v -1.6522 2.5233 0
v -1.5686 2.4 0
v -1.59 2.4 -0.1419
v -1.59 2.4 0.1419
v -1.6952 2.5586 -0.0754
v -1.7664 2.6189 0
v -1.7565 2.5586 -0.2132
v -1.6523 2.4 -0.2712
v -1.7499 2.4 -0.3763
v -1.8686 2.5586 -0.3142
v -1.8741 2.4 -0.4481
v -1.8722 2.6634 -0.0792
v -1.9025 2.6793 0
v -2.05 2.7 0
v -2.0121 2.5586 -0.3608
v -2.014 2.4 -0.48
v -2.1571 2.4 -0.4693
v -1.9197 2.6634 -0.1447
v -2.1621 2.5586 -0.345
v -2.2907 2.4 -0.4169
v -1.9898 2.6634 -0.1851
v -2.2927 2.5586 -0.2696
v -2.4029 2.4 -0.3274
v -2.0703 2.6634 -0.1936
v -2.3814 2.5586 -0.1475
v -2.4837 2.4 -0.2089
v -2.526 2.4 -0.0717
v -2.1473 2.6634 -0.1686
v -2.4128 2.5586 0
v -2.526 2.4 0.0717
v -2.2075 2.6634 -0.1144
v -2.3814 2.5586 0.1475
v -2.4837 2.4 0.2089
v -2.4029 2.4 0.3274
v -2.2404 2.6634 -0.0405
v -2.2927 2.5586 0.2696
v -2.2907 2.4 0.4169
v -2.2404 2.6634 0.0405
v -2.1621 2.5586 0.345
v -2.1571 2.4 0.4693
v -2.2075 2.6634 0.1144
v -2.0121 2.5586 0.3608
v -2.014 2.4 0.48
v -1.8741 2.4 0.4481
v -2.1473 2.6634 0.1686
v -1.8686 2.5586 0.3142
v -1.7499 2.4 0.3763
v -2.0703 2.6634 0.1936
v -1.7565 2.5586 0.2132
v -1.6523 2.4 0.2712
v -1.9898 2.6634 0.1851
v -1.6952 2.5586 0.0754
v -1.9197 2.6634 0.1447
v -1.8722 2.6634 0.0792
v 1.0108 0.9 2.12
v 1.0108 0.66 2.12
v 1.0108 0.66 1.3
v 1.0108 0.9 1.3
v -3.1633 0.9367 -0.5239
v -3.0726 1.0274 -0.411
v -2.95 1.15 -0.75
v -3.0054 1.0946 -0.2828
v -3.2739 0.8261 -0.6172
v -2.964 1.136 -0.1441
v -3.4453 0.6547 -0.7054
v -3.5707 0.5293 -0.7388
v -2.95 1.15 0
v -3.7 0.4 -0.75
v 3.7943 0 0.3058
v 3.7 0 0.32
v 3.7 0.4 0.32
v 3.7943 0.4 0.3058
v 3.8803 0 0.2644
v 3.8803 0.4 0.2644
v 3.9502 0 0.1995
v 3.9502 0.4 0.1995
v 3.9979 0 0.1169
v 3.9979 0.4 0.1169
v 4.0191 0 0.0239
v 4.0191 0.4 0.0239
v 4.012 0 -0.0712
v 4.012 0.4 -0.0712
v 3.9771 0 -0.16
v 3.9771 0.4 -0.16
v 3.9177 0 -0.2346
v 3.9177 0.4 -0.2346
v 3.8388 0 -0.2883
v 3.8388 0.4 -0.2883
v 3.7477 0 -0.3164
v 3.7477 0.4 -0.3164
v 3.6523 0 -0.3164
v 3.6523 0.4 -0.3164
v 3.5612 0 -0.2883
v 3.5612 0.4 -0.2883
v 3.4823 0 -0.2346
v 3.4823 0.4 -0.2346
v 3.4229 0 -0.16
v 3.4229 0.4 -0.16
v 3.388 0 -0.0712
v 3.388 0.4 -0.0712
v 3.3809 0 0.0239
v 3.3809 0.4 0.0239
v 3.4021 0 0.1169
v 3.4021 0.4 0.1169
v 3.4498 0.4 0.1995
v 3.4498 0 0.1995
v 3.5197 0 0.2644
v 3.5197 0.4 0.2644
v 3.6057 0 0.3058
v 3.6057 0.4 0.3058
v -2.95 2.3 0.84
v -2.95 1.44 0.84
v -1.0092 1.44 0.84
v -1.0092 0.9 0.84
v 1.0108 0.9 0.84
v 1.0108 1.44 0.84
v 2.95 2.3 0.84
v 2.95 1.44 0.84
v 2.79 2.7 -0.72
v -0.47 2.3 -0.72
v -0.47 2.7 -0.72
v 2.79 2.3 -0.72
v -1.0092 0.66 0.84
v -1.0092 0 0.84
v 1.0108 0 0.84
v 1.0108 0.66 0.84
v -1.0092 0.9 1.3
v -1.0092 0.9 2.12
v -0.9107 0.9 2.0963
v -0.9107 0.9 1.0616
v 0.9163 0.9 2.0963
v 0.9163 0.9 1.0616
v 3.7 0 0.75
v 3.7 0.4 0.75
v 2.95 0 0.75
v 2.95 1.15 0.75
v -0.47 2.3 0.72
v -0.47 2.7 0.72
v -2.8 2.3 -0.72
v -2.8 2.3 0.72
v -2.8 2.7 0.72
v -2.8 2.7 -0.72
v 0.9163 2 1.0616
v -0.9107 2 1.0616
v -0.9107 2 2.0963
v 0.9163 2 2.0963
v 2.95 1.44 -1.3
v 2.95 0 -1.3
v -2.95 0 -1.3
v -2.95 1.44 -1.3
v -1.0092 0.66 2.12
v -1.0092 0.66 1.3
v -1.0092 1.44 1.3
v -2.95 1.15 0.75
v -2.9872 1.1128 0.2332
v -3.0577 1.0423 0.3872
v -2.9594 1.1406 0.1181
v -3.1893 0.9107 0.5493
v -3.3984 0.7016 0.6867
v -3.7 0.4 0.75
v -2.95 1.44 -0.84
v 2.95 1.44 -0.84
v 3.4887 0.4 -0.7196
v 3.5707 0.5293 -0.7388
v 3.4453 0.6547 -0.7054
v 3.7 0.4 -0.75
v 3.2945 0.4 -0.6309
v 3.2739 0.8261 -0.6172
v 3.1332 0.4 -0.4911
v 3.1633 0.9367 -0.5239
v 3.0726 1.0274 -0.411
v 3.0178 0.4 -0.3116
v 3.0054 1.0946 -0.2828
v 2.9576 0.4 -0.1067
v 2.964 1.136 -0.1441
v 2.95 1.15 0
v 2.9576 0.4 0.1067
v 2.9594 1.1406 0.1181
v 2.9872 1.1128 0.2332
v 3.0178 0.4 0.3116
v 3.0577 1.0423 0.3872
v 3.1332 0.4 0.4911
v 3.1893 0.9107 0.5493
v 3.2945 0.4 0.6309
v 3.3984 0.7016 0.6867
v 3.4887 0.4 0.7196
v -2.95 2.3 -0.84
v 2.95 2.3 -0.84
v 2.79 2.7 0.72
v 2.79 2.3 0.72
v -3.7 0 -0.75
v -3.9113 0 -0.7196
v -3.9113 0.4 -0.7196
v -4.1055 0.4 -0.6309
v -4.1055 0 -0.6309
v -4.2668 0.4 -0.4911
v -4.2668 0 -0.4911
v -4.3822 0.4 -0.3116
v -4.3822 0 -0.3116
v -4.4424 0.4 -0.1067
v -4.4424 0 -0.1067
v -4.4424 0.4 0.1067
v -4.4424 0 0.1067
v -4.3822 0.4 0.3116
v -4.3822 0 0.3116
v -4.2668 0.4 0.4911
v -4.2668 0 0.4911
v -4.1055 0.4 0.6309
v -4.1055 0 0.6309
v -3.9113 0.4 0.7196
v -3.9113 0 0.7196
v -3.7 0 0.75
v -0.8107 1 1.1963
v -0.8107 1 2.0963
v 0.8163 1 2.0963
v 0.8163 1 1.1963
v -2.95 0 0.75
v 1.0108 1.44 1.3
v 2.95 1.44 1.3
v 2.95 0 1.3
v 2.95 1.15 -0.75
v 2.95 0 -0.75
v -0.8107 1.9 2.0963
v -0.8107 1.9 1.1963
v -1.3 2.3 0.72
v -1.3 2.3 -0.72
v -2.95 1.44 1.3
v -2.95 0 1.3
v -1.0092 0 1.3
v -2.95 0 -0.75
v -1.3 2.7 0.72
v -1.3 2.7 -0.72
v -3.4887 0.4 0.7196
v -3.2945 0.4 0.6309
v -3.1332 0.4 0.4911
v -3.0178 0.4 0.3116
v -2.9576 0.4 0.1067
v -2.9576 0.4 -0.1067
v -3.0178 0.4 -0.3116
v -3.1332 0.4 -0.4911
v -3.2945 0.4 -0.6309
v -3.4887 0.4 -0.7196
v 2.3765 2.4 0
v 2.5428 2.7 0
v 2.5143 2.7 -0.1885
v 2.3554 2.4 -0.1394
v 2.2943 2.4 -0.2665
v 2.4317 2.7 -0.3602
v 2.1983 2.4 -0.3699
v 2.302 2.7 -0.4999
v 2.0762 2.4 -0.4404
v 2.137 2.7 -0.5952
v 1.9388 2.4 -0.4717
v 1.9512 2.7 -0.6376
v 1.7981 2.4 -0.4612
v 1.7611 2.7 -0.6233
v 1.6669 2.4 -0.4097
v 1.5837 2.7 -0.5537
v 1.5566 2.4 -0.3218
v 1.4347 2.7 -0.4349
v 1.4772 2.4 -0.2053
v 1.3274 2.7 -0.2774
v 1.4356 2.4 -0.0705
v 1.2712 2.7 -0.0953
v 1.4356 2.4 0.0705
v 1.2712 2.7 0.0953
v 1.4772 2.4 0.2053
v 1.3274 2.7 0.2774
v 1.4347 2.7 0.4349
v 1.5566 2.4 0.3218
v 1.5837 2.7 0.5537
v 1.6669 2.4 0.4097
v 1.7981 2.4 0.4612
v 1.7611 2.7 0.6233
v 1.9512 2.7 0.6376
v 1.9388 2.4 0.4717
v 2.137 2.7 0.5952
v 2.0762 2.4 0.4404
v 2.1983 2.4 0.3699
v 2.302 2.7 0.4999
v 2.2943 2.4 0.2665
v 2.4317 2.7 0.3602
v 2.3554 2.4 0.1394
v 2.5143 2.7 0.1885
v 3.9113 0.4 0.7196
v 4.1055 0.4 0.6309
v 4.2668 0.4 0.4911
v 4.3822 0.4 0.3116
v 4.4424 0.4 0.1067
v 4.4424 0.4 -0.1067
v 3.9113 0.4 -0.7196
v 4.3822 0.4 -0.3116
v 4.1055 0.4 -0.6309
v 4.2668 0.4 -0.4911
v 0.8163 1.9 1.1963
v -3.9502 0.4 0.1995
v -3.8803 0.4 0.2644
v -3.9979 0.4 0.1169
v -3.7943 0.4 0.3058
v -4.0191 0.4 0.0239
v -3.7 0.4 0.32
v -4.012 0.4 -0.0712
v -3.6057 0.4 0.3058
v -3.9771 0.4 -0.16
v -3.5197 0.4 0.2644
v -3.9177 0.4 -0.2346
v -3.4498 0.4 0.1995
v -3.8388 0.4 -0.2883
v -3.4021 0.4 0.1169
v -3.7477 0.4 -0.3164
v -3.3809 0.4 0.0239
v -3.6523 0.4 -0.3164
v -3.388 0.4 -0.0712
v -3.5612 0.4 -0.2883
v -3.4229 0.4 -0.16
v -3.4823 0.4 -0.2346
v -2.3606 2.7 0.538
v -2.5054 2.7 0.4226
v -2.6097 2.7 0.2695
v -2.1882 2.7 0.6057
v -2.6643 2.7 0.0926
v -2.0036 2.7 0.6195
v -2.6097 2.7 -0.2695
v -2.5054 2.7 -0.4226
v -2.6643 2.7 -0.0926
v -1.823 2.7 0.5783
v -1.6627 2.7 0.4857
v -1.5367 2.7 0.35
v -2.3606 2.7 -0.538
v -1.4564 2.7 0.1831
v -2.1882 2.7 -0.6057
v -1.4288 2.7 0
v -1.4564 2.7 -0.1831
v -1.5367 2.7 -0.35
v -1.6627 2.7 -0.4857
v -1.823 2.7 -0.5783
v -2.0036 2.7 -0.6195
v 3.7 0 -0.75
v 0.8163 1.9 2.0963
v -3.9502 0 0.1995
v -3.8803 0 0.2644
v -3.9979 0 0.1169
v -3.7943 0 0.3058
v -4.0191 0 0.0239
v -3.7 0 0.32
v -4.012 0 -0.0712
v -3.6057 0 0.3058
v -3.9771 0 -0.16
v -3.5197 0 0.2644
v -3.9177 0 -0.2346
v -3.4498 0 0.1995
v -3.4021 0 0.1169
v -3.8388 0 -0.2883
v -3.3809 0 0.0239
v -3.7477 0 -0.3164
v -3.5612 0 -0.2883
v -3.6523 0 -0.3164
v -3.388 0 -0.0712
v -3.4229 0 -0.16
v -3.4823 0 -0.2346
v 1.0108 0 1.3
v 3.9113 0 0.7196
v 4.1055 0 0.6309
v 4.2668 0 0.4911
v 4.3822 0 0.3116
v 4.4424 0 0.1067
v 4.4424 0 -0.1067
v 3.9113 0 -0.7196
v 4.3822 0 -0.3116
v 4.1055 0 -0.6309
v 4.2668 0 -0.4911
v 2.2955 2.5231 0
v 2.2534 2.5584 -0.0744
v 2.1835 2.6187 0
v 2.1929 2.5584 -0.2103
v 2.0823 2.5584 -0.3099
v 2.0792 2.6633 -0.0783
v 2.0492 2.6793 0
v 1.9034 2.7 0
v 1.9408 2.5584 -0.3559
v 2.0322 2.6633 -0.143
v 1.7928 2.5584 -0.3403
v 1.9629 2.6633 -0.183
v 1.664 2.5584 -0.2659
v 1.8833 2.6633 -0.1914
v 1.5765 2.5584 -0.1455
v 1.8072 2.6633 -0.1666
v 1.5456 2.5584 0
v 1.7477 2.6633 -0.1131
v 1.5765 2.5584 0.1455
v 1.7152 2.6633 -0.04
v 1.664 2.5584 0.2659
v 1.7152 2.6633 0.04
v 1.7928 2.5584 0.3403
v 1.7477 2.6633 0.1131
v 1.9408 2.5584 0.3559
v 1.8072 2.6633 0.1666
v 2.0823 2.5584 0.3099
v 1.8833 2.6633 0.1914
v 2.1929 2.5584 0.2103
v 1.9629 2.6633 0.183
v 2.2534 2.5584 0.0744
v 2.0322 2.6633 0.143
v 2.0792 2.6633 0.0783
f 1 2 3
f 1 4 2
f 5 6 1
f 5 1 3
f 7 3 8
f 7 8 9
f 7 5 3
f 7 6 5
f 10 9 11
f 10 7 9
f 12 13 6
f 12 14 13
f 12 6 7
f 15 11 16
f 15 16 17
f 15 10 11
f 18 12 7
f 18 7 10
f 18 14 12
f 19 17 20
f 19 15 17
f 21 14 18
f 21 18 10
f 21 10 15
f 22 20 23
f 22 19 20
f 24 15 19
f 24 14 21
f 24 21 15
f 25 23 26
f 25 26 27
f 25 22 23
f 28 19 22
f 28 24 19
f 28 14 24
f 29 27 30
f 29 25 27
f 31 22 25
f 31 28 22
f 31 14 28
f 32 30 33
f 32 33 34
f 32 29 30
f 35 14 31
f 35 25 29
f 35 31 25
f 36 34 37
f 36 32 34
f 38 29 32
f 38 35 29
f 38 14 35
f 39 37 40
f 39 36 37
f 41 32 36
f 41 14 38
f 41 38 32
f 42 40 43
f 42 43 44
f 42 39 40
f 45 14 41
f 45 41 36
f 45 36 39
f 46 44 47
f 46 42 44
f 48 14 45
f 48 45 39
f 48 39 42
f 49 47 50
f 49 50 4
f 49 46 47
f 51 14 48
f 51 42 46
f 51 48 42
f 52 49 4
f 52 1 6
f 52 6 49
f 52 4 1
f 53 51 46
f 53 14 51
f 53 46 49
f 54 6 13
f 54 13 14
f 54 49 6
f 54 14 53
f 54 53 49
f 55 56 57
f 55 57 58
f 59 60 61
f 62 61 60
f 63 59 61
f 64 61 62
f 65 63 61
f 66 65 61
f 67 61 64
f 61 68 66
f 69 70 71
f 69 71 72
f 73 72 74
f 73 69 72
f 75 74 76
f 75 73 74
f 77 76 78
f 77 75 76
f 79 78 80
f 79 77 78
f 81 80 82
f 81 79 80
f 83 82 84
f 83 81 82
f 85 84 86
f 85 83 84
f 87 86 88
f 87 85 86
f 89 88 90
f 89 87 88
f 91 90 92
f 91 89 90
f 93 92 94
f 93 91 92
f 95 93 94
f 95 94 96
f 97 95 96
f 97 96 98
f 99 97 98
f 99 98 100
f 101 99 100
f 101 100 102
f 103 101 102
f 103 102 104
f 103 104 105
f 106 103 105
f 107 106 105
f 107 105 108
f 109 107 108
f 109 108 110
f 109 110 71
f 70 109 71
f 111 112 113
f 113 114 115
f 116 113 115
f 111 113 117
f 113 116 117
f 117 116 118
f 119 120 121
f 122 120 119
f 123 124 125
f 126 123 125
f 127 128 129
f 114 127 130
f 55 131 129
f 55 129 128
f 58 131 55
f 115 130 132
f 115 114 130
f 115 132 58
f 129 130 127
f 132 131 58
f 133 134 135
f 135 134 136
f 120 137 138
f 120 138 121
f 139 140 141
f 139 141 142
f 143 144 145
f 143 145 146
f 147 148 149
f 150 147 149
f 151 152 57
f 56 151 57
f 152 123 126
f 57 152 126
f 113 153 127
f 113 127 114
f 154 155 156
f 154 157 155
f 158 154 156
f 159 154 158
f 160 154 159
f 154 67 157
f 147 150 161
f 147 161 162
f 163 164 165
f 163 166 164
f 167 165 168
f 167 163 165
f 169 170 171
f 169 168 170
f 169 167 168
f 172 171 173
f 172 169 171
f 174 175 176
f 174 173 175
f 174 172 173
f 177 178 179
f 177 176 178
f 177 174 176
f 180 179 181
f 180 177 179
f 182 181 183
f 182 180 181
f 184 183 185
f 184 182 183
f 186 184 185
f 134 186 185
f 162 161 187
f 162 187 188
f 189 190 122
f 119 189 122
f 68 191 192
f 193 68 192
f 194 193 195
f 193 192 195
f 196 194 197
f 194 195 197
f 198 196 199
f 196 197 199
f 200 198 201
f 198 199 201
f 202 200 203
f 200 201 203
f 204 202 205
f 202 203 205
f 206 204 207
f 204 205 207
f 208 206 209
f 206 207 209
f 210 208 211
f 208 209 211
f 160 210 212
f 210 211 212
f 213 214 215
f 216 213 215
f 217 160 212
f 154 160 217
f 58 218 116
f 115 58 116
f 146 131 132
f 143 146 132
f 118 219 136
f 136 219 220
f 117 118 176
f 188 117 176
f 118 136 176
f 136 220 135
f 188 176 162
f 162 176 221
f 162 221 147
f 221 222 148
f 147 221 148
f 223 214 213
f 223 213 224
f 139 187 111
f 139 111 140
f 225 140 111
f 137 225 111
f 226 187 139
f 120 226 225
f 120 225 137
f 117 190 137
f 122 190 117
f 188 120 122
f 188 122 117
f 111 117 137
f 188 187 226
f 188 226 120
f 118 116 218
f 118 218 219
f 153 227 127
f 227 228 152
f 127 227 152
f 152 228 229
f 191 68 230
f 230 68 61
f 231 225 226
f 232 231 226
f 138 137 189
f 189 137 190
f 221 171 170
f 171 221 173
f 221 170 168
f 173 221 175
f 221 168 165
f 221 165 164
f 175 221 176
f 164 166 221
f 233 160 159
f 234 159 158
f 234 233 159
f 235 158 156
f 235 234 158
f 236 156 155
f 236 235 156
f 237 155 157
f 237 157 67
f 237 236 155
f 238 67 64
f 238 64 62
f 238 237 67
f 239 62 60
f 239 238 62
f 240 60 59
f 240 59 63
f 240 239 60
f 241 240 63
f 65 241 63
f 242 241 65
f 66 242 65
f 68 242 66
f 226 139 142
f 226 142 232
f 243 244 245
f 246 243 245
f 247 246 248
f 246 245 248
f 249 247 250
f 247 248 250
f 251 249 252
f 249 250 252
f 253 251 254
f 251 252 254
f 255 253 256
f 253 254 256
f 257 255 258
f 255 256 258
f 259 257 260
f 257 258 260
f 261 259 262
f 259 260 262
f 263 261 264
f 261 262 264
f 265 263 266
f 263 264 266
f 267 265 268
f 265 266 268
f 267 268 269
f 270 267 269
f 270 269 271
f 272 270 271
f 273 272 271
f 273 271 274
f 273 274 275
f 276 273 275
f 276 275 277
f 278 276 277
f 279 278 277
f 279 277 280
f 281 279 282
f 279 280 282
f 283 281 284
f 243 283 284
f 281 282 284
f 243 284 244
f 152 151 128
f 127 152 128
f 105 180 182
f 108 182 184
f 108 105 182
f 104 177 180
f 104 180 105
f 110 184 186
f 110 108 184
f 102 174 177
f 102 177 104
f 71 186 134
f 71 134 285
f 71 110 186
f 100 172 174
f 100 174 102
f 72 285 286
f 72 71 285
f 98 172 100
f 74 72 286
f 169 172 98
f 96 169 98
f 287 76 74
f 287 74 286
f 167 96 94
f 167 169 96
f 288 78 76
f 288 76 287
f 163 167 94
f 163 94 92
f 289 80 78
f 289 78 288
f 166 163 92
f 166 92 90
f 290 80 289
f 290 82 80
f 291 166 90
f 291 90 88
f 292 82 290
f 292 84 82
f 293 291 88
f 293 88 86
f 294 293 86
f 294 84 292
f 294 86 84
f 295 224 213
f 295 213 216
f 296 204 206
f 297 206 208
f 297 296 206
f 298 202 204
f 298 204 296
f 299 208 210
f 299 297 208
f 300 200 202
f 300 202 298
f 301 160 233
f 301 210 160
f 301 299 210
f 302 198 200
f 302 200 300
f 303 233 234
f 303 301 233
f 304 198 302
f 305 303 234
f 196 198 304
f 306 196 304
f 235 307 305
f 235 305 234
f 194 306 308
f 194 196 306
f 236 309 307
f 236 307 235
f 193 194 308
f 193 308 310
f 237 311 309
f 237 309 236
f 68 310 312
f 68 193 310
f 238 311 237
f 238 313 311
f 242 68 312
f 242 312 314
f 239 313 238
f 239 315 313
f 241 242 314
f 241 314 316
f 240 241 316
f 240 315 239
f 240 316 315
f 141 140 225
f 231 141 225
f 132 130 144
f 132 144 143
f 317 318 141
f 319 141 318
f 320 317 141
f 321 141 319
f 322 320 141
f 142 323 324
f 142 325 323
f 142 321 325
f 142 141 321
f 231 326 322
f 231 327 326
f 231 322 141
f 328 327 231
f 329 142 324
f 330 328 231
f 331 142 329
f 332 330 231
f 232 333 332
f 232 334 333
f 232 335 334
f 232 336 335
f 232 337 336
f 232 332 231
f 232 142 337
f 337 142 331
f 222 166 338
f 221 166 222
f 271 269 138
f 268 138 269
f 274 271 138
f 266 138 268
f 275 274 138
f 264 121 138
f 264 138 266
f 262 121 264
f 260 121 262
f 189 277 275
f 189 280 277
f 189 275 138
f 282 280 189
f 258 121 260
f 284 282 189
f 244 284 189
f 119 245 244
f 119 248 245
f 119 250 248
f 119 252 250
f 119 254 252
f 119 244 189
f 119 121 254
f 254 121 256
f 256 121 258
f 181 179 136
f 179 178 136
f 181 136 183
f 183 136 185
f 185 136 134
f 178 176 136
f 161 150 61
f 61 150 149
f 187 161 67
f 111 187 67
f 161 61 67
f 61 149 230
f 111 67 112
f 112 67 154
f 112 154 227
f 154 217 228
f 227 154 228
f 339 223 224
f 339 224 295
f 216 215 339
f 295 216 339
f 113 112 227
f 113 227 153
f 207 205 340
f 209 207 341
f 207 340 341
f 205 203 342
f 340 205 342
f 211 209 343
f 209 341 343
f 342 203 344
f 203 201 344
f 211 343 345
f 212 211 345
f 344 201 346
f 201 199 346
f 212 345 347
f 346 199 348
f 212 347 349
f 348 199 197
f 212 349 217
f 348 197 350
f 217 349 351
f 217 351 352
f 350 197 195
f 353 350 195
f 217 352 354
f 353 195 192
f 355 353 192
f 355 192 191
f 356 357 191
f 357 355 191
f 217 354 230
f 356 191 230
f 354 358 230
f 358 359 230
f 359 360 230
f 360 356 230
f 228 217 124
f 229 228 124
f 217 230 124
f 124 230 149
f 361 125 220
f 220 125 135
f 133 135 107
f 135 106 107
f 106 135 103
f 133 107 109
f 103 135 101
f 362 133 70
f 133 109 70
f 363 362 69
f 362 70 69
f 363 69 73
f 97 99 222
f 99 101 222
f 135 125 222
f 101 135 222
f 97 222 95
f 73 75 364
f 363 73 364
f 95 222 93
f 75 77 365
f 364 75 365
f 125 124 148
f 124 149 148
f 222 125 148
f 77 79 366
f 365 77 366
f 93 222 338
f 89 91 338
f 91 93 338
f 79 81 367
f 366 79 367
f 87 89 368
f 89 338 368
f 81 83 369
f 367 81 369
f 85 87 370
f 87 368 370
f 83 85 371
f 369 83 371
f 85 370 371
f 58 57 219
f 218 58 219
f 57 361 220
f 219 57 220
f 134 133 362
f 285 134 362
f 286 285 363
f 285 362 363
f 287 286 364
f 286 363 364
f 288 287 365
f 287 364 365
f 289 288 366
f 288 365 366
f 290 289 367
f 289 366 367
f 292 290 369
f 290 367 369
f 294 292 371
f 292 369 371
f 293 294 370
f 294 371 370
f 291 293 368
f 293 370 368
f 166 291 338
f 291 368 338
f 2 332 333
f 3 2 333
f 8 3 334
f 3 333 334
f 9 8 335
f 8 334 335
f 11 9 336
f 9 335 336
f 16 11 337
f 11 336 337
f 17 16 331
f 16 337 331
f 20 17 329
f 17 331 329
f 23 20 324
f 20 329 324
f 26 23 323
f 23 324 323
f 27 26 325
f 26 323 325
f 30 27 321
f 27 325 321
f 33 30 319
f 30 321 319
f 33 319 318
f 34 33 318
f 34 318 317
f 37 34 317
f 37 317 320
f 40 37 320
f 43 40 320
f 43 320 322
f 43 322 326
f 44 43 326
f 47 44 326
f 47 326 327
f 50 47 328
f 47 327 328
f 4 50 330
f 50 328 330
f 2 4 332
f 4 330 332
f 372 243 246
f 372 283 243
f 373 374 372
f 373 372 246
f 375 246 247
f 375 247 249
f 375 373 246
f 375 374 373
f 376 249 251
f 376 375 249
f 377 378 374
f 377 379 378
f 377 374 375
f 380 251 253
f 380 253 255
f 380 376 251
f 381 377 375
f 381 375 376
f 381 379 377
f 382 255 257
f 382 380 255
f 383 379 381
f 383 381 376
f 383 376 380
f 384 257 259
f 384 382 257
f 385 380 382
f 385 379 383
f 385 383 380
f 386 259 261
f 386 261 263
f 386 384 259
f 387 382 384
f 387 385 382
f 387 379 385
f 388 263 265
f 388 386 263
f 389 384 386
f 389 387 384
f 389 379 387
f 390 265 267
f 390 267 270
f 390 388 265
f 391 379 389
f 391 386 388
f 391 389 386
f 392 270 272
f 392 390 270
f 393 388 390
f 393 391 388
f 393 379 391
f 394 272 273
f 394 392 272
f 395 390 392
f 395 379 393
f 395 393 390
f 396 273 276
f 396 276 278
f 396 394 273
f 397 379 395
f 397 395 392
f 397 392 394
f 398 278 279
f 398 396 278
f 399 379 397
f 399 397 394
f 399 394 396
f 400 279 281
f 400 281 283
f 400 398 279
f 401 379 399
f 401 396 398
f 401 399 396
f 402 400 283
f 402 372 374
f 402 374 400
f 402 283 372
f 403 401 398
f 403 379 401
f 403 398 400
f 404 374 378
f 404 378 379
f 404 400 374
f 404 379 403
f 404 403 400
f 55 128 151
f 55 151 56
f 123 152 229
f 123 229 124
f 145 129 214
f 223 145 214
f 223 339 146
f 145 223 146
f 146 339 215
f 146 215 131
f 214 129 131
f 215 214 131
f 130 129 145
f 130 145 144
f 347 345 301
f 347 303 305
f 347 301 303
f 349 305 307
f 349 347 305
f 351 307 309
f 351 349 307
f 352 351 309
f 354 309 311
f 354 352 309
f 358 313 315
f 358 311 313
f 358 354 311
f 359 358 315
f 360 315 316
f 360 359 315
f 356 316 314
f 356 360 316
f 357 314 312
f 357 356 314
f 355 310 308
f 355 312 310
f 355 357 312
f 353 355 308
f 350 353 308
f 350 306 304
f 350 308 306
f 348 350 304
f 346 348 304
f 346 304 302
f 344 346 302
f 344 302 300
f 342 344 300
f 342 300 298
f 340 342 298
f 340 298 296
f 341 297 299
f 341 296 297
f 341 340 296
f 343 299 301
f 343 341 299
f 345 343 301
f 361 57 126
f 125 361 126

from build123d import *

# Parameters (mm, degrees)
BOSS_EXTRUDE1_DEPTH   = 7.2
SKETCH1_3_R           = 3.75
SKETCH1_3_R_2         = 1.6
BOSS_EXTRUDE2_DEPTH   = 2
BOSS_EXTRUDE2_2_DEPTH = 2
BOSS_EXTRUDE3_DEPTH   = 2
BOSS_EXTRUDE4_DEPTH   = 7.5
SKETCH3_R             = 3.75
CUT_EXTRUDE6_DEPTH    = 12
BOSS_EXTRUDE5_DEPTH   = 7.5
SKETCH5_R             = 3.75
CUT_EXTRUDE7_DEPTH    = 7.5
SKETCH6_W             = 29.5
SKETCH6_H             = 8.4
BOSS_EXTRUDE6_DEPTH   = 4.3
SKETCH7_W             = 7.5
SKETCH7_H             = 7.2
SKETCH7_W_2           = 16.3
BOSS_EXTRUDE7_DEPTH   = 2
SKETCH8_W             = 10.1
SKETCH8_H             = 2.3
CUT_EXTRUDE8_DEPTH    = 12
SKETCH9_W             = 10.1
SKETCH9_H             = 1.2
BOSS_EXTRUDE8_DEPTH   = 6.4
SKETCH11_W            = 9.1347476
SKETCH11_H            = 5.173710516
BOSS_EXTRUDE11_DEPTH  = 5.5
SKETCH12_R            = 3.106234899
CUT_EXTRUDE10_DEPTH   = 1.5
CUT_EXTRUDE10_DRAFT   = -25
SKETCH13_R            = 3.196774454
CUT_EXTRUDE11_DEPTH   = 1.5
CUT_EXTRUDE11_DRAFT   = -29
SKETCH14_W            = 8.1347476
SKETCH14_H            = 4.5
CUT_EXTRUDE12_DEPTH   = 4.5
SCALE1_SCALE          = 0.2


# Read off the part's stored shape, not the designer's step: Dome1, Dome2
with BuildPart() as part:
    # Sketch1 → Boss-Extrude1 (new body)
    with BuildSketch(Plane(origin=(0, 0, 0), x_dir=(1, 0, 0), z_dir=(0, 1, 0))):
        Polygon((14.75, 0), (-14.75, 0), (-14.75, -3.75), (-14.75, -6.5), (14.75, -6.5), (14.75, -3.75), align=None)
        Polygon((-14.75, 3.75), (-14.75, 0), (14.75, 0), (14.75, 3.75), (14.75, 6.5), (-14.75, 6.5), align=None)
    extrude(amount=BOSS_EXTRUDE1_DEPTH)



with BuildPart() as body_2:
    # Sketch1<3> → Boss-Extrude2 (new body)
    with BuildSketch(Plane(origin=(0, 0, 0), x_dir=(1, 0, 0), z_dir=(0, 1, 0))):
        with Locations(Location((-18.5, 0, 0), (0, 0, 270))):
            Circle(SKETCH1_3_R)
        with Locations(Location((-18.5, 0, 0), (0, 0, 270))):
            Circle(SKETCH1_3_R_2, mode=Mode.SUBTRACT)
    extrude(amount=BOSS_EXTRUDE2_DEPTH)


with BuildPart() as body_3:
    # Sketch1<3> → Boss-Extrude2 2 (new body)
    with BuildSketch(Plane(origin=(0, 0, 0), x_dir=(1, 0, 0), z_dir=(0, 1, 0))):
        with Locations(Location((18.5, 0, 0), (0, 0, 270))):
            Circle(SKETCH1_3_R)
        with Locations(Location((18.5, 0, 0), (0, 0, 270))):
            Circle(SKETCH1_3_R_2, mode=Mode.SUBTRACT)
    extrude(amount=BOSS_EXTRUDE2_2_DEPTH)


with BuildPart() as part_1:
    add(part.part)

    add(body_2.part)  # Boss-Extrude3 merges body 2

    add(body_3.part)  # Boss-Extrude3 merges body 3
    # Sketch1<4> → Boss-Extrude3 (add)
    with BuildSketch(Plane(origin=(0, 0, 0), x_dir=(1, 0, 0), z_dir=(0, 1, 0))):
        with BuildLine():
            Line((-14.75, -3.75), (-14.75, 0))
            ThreePointArc((-14.75, 0), (-15.848349571, -2.651650429), (-18.5, -3.75))
            Line((-18.5, -3.75), (-14.75, -3.75))
        make_face()
        with BuildLine():
            Line((-14.75, 0), (-14.75, 3.75))
            Line((-14.75, 3.75), (-18.5, 3.75))
            ThreePointArc((-18.5, 3.75), (-15.848349571, 2.651650429), (-14.75, 0))
        make_face()
        with BuildLine():
            Line((18.5, 3.75), (14.75, 3.75))
            Line((14.75, 3.75), (14.75, 0))
            ThreePointArc((14.75, 0), (15.848349571, 2.651650429), (18.5, 3.75))
        make_face()
        with BuildLine():
            ThreePointArc((18.5, -3.75), (15.848349571, -2.651650429), (14.75, 0))
            Line((14.75, 0), (14.75, -3.75))
            Line((14.75, -3.75), (18.5, -3.75))
        make_face()
    extrude(amount=BOSS_EXTRUDE3_DEPTH)

    # Sketch2 → Boss-Extrude4 (add)
    with BuildSketch(Plane.XY.offset(3.75)):
        Polygon((18.5, 2), (14.75, 2), (14.75, 5.75), align=None)
    extrude(amount=-BOSS_EXTRUDE4_DEPTH)

    # Sketch3 → Cut-Extrude6 (cut)
    with BuildSketch(Plane(origin=(0, 2, 0), x_dir=(1, 0, 0), z_dir=(0, 1, 0))):
        with Locations((18.5, 0)):
            Circle(SKETCH3_R)
    extrude(amount=CUT_EXTRUDE6_DEPTH, mode=Mode.SUBTRACT)

    # Sketch4 → Boss-Extrude5 (add)
    with BuildSketch(Plane.XY.offset(3.75)):
        Polygon((-14.75, 5.75), (-18.5, 2), (-14.75, 2), align=None)
    extrude(amount=-BOSS_EXTRUDE5_DEPTH)

    # Sketch5 → Cut-Extrude7 (cut)
    with BuildSketch(Plane(origin=(0, 2, 0), x_dir=(1, 0, 0), z_dir=(0, 1, 0))):
        with Locations((-18.5, 0)):
            Circle(SKETCH5_R)
    extrude(amount=CUT_EXTRUDE7_DEPTH, mode=Mode.SUBTRACT)

    # Sketch6 → Boss-Extrude6 (add)
    with BuildSketch(Plane(origin=(0, 7.2, 0), x_dir=(1, 0, 0), z_dir=(0, 1, 0))):
        Rectangle(SKETCH6_W, SKETCH6_H)
    extrude(amount=BOSS_EXTRUDE6_DEPTH)

    # Sketch7 → Boss-Extrude7 (add)
    with BuildSketch(Plane(origin=(0, 11.5, 0), x_dir=(1, 0, 0), z_dir=(0, 1, 0))):
        with Locations((-10.25, 0)):
            Rectangle(SKETCH7_W, SKETCH7_H)
        with Locations((5.8, 0)):
            Rectangle(SKETCH7_W_2, SKETCH7_H)
    extrude(amount=BOSS_EXTRUDE7_DEPTH)

    # Sketch8 → Cut-Extrude8 (cut)
    with BuildSketch(Plane(origin=(0, 7.2, 0), x_dir=(1, 0, 0), z_dir=(0, 1, 0))):
        with Locations((0.003829246, -5.35)):
            Rectangle(SKETCH8_W, SKETCH8_H)
    extrude(amount=-CUT_EXTRUDE8_DEPTH, mode=Mode.SUBTRACT)

    # Sketch9 → Boss-Extrude8 (add)
    with BuildSketch(Plane.XY.offset(4.2)):
        with Locations((0.003829246, 3.9)):
            Rectangle(SKETCH9_W, SKETCH9_H)
    extrude(amount=BOSS_EXTRUDE8_DEPTH)

    # Sketch11 → Boss-Extrude11 (add)
    with BuildSketch(Plane(origin=(0, 4.5, 0), x_dir=(1, 0, 0), z_dir=(0, 1, 0))):
        with Locations((0.014014126, -7.894862881)):
            Rectangle(SKETCH11_W, SKETCH11_H)
    extrude(amount=BOSS_EXTRUDE11_DEPTH)


with BuildPart() as cut_extrude10_tool:
    # Sketch12 → Cut-Extrude10 (with draft: the straight prism first)
    with BuildSketch(Plane(origin=(0, 13.5, 0), x_dir=(1, 0, 0), z_dir=(0, 1, 0))):
        with Locations((-10.25, 0)):
            Circle(SKETCH12_R)
    extrude(amount=-CUT_EXTRUDE10_DEPTH)
    # Cut-Extrude10: the draft: its side faces are tilted about the plane it starts from
    cut_extrude10_sides = [cut_extrude10_tool.faces().sort_by_distance(p)[0] for p in [
        (-13.356234899, 12.75, 0),
    ]]
    draft(cut_extrude10_sides, Plane(origin=(0, 13.5, 0), x_dir=(1, 0, 0), z_dir=(0, 1, 0)), CUT_EXTRUDE10_DRAFT)


with BuildPart() as part_2:
    add(part_1.part)

    # Cut-Extrude10: cut by cut_extrude10_tool
    add(cut_extrude10_tool.part, mode=Mode.SUBTRACT)


with BuildPart() as cut_extrude11_tool:
    # Sketch13 → Cut-Extrude11 (with draft: the straight prism first)
    with BuildSketch(Plane(origin=(0, 13.5, 0), x_dir=(1, 0, 0), z_dir=(0, 1, 0))):
        with Locations((9.516994158, 0)):
            Circle(SKETCH13_R)
    extrude(amount=-CUT_EXTRUDE11_DEPTH)
    # Cut-Extrude11: the draft: its side faces are tilted about the plane it starts from
    cut_extrude11_sides = [cut_extrude11_tool.faces().sort_by_distance(p)[0] for p in [
        (6.320219704, 12.75, 0),
    ]]
    draft(cut_extrude11_sides, Plane(origin=(0, 13.5, 0), x_dir=(1, 0, 0), z_dir=(0, 1, 0)), CUT_EXTRUDE11_DRAFT)


with BuildPart() as part_3:
    add(part_2.part)

    # Cut-Extrude11: cut by cut_extrude11_tool
    add(cut_extrude11_tool.part, mode=Mode.SUBTRACT)

    # Dome1 outline → Dome1 (revolve)
    with BuildSketch(Plane(origin=(-10.25, 0, 0), x_dir=(1, 0, 0), z_dir=(0, 0, 1))):
        with BuildLine():
            Line((0, 12), (2.406773413, 11.999999998))
            ThreePointArc((2.406773413, 11.999999998), (1.417970228, 13.094302608), (0, 13.5))
            Line((0, 13.5), (0, 12))
        make_face()
    revolve(axis=Axis((-10.25, 0, 0), (0, 1, 0)))

    # Dome2 outline → Dome2 (revolve)
    with BuildSketch(Plane(origin=(9.516994158, 0, 0), x_dir=(1, 0, 0), z_dir=(0, 0, 1))):
        with BuildLine():
            Line((0, 12), (2.365310878, 11.999999998))
            ThreePointArc((2.365310878, 11.999999998), (1.400419183, 13.093385967), (0, 13.5))
            Line((0, 13.5), (0, 12))
        make_face()
    revolve(axis=Axis((9.516994158, 0, 0), (0, 1, 0)))

    # Sketch14 → Cut-Extrude12 (cut)
    with BuildSketch(Plane.XY.offset(10.481718139)):
        with Locations((0.014014126, 7.25)):
            Rectangle(SKETCH14_W, SKETCH14_H)
    extrude(amount=-CUT_EXTRUDE12_DEPTH, mode=Mode.SUBTRACT)


with BuildPart() as part_4:
    # Scale1: scaled about (0, 0, 0)
    add(part_3.part.scale(SCALE1_SCALE))


solid = part_4.part
